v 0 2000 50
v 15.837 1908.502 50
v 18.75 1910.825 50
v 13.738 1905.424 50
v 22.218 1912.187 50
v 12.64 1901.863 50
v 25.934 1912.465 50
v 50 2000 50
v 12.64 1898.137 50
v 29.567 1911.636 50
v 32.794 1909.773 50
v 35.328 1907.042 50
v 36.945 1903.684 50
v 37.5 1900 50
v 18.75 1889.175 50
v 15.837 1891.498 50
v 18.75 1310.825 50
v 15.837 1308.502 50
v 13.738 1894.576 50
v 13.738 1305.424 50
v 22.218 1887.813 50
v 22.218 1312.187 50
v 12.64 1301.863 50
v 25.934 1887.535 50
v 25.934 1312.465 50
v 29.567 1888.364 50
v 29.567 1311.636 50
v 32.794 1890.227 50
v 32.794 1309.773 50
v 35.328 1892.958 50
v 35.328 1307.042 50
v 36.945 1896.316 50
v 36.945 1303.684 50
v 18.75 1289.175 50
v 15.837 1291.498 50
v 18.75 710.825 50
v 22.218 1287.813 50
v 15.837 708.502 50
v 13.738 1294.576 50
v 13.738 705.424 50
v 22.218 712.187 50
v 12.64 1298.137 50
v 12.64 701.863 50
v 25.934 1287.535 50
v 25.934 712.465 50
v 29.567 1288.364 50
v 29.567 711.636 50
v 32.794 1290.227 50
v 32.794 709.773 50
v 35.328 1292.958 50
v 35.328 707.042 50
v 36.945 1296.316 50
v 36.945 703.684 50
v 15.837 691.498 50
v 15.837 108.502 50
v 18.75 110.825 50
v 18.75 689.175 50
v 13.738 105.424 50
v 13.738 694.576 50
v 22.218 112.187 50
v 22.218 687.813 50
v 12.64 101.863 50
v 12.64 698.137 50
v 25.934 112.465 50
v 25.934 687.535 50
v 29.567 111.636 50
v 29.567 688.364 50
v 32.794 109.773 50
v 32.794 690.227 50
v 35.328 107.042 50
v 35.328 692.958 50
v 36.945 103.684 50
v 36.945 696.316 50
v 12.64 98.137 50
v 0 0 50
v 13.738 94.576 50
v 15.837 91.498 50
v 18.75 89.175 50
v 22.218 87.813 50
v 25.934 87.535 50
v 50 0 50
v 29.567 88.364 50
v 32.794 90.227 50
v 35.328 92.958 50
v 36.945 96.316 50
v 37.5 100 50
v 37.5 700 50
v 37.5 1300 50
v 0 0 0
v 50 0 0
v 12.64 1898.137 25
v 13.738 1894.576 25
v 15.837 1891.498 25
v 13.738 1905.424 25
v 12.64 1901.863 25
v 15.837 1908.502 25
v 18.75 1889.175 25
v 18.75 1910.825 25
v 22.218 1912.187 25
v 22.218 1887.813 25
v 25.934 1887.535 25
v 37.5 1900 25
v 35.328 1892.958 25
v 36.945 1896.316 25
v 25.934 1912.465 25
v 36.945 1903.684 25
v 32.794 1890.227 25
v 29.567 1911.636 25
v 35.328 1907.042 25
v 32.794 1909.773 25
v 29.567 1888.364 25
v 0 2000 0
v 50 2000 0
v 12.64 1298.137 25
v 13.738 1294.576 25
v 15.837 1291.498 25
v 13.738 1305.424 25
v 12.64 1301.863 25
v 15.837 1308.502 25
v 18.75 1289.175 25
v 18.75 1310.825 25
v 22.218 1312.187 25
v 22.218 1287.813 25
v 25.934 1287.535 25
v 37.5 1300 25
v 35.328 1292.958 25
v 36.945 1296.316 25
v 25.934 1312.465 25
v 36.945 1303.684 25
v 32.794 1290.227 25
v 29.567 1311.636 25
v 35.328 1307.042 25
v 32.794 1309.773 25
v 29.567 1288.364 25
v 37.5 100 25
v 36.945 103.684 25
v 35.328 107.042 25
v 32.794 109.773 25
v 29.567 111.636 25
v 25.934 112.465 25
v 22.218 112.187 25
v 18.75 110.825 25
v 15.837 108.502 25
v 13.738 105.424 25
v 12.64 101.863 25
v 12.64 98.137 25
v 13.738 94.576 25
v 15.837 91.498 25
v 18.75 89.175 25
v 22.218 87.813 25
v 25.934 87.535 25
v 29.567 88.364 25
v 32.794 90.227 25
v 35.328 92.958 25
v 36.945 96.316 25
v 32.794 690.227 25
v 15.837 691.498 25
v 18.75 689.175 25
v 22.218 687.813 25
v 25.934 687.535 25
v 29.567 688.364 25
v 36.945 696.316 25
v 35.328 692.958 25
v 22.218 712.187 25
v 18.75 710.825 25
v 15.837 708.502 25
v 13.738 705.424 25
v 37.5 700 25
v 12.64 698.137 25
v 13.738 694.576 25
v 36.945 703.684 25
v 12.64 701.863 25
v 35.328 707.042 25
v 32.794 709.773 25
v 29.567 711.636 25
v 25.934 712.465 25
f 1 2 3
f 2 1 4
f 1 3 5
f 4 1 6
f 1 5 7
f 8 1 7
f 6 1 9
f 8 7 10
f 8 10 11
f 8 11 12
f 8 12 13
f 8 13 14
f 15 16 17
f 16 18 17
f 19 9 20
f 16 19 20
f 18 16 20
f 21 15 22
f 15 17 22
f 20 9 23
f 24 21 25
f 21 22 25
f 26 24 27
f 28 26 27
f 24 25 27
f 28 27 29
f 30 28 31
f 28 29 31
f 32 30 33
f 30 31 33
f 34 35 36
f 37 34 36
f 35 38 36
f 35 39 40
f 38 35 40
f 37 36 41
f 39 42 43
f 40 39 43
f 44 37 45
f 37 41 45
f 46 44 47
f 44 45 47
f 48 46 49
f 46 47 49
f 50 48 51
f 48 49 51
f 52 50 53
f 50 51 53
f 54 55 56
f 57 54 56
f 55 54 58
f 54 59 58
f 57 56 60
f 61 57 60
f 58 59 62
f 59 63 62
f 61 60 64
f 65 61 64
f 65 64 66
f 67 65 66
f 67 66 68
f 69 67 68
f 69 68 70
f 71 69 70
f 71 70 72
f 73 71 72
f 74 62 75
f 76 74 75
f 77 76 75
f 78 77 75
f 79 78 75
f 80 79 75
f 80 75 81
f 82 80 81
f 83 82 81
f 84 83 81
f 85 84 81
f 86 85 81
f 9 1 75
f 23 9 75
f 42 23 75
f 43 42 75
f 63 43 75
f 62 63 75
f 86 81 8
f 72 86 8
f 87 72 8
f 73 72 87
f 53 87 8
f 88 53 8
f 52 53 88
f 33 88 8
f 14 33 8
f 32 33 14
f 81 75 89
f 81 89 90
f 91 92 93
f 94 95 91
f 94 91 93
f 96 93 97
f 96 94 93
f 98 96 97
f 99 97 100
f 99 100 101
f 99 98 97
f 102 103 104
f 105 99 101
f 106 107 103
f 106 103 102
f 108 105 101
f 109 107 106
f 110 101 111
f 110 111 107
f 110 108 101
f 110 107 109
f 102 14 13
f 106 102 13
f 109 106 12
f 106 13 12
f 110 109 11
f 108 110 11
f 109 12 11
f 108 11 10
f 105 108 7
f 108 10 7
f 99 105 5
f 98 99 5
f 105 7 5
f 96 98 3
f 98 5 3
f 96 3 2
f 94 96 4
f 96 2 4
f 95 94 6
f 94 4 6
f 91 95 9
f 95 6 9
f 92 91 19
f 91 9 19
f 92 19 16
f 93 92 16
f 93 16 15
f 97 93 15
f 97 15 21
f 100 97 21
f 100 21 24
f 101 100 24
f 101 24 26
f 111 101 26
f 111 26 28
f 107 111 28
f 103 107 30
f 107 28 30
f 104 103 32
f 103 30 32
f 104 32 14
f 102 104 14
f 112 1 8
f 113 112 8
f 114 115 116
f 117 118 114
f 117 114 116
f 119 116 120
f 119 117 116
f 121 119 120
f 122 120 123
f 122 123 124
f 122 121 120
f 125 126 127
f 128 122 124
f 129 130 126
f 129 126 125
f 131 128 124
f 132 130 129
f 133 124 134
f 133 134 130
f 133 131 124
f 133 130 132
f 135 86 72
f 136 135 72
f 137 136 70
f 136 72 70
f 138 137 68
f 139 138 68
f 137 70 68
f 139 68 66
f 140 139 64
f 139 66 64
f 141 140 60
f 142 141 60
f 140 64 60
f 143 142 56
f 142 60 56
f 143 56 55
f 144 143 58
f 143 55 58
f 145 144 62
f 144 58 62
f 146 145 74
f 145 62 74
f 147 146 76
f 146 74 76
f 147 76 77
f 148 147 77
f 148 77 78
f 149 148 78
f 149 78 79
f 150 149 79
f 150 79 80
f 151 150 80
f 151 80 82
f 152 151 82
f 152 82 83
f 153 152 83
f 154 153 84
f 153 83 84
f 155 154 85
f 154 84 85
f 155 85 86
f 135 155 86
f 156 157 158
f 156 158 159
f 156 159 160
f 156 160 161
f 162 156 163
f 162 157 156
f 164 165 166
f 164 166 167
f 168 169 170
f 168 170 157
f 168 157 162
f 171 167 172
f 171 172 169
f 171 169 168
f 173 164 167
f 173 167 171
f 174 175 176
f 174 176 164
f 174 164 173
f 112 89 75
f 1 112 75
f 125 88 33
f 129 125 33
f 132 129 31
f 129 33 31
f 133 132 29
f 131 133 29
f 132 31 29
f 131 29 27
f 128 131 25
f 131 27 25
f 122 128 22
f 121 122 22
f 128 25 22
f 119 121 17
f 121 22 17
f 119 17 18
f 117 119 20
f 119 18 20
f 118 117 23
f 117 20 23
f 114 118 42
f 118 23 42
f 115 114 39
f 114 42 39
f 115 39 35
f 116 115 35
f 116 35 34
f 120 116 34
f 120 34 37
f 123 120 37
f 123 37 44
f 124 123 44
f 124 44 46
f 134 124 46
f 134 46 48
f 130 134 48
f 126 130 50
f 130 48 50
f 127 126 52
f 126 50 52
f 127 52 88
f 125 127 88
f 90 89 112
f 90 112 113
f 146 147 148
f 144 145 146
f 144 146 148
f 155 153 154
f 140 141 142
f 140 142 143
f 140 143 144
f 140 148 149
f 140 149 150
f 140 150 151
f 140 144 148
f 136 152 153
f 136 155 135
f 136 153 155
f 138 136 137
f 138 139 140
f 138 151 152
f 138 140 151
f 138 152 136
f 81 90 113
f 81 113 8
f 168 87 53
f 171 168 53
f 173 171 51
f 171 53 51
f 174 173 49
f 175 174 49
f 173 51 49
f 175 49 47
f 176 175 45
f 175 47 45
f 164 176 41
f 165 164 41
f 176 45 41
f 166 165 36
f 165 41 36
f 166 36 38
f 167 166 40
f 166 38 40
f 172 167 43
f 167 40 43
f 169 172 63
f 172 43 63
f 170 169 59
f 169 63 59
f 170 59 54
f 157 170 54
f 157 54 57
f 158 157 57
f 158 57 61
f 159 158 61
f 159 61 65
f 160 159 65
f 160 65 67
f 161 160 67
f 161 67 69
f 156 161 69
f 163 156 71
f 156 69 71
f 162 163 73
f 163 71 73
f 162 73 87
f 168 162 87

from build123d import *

# Parameters (mm, degrees)
F0_W     = 50
F0_H     = 50
F1_DEPTH = 2000
F2_R     = 12.5
F3_DEPTH = 25


with BuildPart() as f1:
    # F0 (on Front) → F1 (new body)
    with BuildSketch(Plane.XZ):
        with Locations((25, 25)):
            Rectangle(F0_W, F0_H)
    extrude(amount=-F1_DEPTH)

    # F2 (on face) → F3 (cut)
    with BuildSketch(Plane.XY.offset(50)):
        with Locations((25, 100)):
            Circle(F2_R)
        with Locations((25, 1900)):
            Circle(F2_R)
        with Locations((25, 1300)):
            Circle(F2_R)
        with Locations((25, 700)):
            Circle(F2_R)
    extrude(amount=-F3_DEPTH, mode=Mode.SUBTRACT)


solid = f1.part
